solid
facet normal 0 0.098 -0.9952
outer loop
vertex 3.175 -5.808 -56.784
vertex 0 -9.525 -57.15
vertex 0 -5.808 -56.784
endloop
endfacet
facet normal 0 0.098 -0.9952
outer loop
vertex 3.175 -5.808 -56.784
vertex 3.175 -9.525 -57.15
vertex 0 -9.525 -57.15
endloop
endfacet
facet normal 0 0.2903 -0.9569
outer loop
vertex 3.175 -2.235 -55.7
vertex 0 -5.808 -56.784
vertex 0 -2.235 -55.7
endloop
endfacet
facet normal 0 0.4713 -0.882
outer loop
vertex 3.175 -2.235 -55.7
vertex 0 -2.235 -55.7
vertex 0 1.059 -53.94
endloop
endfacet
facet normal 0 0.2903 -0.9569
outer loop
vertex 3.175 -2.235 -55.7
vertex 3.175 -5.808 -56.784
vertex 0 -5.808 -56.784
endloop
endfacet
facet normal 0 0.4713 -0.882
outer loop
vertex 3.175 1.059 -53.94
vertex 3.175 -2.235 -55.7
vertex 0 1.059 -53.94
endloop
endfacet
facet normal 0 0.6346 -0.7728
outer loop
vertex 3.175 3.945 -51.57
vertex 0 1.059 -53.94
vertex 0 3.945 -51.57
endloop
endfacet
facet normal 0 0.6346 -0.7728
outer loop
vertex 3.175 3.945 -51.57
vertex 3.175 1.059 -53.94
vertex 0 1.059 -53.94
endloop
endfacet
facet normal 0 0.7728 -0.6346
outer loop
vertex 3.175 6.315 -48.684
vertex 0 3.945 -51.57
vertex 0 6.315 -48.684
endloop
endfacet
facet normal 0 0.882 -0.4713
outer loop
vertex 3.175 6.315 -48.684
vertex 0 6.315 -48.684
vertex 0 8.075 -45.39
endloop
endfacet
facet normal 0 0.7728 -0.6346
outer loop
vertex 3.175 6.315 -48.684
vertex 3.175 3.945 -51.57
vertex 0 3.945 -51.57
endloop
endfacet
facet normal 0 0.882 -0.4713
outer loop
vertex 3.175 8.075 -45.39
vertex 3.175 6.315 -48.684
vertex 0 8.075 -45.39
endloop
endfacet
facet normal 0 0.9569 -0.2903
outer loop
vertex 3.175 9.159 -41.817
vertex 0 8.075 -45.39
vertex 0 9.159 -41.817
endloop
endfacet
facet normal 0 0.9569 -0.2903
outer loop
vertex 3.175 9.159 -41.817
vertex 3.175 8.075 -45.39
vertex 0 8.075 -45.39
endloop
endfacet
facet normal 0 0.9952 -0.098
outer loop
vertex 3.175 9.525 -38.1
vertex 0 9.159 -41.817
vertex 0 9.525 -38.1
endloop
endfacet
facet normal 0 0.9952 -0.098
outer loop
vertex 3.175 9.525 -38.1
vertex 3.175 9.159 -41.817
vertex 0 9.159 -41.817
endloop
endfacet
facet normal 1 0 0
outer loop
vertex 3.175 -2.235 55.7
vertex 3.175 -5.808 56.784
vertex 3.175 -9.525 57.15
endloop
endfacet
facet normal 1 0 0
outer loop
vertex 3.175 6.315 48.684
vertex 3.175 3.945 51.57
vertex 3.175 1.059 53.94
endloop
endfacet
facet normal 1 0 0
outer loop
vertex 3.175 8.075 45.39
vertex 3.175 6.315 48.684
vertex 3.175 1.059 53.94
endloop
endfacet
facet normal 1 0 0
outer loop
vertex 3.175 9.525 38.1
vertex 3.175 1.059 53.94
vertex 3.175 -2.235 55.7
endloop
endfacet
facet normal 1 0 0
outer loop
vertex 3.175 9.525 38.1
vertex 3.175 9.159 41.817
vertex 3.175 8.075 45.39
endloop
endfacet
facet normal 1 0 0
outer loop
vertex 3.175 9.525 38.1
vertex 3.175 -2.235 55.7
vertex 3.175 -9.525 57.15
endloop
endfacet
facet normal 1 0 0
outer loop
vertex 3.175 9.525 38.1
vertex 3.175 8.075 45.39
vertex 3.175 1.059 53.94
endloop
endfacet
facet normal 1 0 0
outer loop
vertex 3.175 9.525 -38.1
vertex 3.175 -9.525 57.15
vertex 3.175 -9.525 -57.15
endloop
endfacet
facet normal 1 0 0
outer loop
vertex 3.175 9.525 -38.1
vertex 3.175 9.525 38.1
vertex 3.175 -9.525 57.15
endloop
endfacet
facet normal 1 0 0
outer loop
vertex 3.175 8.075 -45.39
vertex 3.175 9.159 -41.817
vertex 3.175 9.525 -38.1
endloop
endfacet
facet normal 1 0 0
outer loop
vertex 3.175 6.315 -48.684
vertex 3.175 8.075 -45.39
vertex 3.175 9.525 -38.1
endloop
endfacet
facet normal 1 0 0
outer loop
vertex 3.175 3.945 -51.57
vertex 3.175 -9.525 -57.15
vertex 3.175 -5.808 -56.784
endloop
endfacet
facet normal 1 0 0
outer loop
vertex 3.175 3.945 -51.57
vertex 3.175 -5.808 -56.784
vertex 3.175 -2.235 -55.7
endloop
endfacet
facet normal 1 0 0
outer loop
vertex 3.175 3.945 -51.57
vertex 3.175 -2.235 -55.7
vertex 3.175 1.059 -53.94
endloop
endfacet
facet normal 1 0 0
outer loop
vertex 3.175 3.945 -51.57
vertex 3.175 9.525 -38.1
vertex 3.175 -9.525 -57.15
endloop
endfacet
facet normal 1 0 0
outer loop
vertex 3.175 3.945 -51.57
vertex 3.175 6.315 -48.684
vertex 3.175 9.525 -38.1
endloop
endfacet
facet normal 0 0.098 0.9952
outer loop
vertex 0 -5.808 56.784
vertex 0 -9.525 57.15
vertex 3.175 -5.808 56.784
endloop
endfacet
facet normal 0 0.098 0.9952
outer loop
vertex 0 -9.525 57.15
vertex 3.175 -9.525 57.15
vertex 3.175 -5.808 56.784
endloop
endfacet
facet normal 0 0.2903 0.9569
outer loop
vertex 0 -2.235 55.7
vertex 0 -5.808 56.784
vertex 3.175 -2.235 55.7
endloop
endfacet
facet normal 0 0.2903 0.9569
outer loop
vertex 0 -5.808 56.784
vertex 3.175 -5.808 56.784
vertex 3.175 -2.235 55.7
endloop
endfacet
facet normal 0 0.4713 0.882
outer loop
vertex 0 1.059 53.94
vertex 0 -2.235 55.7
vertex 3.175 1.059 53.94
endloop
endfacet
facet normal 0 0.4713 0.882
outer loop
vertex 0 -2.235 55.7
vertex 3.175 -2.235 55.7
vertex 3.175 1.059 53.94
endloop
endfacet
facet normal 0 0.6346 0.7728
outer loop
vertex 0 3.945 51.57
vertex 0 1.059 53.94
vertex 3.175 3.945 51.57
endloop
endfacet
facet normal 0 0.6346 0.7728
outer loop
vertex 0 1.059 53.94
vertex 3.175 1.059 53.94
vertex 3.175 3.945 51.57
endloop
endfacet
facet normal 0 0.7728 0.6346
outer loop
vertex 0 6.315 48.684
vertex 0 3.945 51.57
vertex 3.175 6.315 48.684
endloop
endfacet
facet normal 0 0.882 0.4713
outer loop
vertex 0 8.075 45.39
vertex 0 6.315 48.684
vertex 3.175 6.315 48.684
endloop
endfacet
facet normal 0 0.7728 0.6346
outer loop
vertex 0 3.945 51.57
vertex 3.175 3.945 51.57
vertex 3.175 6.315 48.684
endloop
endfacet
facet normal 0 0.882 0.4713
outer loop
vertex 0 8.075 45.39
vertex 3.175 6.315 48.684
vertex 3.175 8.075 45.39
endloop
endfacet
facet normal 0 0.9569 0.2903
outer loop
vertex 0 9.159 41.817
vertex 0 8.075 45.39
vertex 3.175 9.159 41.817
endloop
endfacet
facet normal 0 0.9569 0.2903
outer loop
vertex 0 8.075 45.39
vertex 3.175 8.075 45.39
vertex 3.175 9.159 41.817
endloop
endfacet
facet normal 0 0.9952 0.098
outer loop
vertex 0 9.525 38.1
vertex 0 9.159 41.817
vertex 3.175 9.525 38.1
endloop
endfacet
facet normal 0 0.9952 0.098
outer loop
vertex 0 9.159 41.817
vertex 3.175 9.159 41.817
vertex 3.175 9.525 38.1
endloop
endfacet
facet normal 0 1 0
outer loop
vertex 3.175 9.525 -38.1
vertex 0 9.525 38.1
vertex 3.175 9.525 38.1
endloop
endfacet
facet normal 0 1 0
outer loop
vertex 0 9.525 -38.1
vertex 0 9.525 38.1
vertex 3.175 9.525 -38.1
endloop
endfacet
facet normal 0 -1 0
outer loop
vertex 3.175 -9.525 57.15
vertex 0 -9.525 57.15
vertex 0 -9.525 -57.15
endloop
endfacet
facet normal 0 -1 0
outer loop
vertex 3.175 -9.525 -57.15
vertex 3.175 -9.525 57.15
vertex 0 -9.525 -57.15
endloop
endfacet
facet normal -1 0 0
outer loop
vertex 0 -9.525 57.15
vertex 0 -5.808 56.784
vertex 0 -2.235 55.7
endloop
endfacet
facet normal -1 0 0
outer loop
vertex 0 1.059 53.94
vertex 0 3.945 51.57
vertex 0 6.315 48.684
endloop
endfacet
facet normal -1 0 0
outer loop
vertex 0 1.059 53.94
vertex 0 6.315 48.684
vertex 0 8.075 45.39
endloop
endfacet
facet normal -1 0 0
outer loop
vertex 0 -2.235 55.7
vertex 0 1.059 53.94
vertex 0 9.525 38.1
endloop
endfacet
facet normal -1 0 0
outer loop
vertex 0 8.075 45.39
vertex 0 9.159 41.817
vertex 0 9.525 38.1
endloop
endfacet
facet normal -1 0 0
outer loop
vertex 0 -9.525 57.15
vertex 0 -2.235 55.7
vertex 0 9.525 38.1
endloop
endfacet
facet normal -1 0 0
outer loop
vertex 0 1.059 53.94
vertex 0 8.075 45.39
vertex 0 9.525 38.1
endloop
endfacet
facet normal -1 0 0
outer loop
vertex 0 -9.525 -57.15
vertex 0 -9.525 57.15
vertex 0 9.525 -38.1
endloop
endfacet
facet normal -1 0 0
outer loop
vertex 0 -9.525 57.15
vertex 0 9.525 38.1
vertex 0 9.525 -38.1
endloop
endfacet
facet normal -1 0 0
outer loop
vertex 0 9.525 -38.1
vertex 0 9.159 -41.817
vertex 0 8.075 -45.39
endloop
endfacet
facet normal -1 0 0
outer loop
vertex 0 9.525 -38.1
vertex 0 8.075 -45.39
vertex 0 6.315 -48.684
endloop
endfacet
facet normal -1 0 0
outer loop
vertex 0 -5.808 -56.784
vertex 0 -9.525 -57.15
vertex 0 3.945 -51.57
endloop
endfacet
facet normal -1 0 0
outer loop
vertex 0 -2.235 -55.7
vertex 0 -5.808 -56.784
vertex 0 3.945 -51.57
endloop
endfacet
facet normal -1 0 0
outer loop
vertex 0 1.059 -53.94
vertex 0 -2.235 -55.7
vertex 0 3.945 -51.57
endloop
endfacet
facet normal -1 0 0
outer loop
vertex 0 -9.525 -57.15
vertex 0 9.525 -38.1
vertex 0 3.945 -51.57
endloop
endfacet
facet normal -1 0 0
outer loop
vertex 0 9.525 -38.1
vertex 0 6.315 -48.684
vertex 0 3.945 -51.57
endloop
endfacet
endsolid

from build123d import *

# Parameters (mm, degrees)
SKETCH1_W           = 114.3
SKETCH1_H           = 19.05
BOSS_EXTRUDE1_DEPTH = 3.175
FILLET1_R           = 19.05


with BuildPart() as part:
    # Sketch1 → Boss-Extrude1 (new body)
    with BuildSketch(Plane(origin=(0, 0, 0), x_dir=(0, 0, -1), z_dir=(1, 0, 0))):
        Rectangle(SKETCH1_W, SKETCH1_H)
    extrude(amount=BOSS_EXTRUDE1_DEPTH)

    # Fillet1
    fillet1_edges = [part.edges().sort_by_distance(p)[0] for p in [
        (1.5875, 9.525, -57.15),
        (1.5875, 9.525, 57.15),
    ]]
    fillet(fillet1_edges, radius=FILLET1_R - 0.0001)  # a hair under: the kernel refuses the full size


solid = part.part
